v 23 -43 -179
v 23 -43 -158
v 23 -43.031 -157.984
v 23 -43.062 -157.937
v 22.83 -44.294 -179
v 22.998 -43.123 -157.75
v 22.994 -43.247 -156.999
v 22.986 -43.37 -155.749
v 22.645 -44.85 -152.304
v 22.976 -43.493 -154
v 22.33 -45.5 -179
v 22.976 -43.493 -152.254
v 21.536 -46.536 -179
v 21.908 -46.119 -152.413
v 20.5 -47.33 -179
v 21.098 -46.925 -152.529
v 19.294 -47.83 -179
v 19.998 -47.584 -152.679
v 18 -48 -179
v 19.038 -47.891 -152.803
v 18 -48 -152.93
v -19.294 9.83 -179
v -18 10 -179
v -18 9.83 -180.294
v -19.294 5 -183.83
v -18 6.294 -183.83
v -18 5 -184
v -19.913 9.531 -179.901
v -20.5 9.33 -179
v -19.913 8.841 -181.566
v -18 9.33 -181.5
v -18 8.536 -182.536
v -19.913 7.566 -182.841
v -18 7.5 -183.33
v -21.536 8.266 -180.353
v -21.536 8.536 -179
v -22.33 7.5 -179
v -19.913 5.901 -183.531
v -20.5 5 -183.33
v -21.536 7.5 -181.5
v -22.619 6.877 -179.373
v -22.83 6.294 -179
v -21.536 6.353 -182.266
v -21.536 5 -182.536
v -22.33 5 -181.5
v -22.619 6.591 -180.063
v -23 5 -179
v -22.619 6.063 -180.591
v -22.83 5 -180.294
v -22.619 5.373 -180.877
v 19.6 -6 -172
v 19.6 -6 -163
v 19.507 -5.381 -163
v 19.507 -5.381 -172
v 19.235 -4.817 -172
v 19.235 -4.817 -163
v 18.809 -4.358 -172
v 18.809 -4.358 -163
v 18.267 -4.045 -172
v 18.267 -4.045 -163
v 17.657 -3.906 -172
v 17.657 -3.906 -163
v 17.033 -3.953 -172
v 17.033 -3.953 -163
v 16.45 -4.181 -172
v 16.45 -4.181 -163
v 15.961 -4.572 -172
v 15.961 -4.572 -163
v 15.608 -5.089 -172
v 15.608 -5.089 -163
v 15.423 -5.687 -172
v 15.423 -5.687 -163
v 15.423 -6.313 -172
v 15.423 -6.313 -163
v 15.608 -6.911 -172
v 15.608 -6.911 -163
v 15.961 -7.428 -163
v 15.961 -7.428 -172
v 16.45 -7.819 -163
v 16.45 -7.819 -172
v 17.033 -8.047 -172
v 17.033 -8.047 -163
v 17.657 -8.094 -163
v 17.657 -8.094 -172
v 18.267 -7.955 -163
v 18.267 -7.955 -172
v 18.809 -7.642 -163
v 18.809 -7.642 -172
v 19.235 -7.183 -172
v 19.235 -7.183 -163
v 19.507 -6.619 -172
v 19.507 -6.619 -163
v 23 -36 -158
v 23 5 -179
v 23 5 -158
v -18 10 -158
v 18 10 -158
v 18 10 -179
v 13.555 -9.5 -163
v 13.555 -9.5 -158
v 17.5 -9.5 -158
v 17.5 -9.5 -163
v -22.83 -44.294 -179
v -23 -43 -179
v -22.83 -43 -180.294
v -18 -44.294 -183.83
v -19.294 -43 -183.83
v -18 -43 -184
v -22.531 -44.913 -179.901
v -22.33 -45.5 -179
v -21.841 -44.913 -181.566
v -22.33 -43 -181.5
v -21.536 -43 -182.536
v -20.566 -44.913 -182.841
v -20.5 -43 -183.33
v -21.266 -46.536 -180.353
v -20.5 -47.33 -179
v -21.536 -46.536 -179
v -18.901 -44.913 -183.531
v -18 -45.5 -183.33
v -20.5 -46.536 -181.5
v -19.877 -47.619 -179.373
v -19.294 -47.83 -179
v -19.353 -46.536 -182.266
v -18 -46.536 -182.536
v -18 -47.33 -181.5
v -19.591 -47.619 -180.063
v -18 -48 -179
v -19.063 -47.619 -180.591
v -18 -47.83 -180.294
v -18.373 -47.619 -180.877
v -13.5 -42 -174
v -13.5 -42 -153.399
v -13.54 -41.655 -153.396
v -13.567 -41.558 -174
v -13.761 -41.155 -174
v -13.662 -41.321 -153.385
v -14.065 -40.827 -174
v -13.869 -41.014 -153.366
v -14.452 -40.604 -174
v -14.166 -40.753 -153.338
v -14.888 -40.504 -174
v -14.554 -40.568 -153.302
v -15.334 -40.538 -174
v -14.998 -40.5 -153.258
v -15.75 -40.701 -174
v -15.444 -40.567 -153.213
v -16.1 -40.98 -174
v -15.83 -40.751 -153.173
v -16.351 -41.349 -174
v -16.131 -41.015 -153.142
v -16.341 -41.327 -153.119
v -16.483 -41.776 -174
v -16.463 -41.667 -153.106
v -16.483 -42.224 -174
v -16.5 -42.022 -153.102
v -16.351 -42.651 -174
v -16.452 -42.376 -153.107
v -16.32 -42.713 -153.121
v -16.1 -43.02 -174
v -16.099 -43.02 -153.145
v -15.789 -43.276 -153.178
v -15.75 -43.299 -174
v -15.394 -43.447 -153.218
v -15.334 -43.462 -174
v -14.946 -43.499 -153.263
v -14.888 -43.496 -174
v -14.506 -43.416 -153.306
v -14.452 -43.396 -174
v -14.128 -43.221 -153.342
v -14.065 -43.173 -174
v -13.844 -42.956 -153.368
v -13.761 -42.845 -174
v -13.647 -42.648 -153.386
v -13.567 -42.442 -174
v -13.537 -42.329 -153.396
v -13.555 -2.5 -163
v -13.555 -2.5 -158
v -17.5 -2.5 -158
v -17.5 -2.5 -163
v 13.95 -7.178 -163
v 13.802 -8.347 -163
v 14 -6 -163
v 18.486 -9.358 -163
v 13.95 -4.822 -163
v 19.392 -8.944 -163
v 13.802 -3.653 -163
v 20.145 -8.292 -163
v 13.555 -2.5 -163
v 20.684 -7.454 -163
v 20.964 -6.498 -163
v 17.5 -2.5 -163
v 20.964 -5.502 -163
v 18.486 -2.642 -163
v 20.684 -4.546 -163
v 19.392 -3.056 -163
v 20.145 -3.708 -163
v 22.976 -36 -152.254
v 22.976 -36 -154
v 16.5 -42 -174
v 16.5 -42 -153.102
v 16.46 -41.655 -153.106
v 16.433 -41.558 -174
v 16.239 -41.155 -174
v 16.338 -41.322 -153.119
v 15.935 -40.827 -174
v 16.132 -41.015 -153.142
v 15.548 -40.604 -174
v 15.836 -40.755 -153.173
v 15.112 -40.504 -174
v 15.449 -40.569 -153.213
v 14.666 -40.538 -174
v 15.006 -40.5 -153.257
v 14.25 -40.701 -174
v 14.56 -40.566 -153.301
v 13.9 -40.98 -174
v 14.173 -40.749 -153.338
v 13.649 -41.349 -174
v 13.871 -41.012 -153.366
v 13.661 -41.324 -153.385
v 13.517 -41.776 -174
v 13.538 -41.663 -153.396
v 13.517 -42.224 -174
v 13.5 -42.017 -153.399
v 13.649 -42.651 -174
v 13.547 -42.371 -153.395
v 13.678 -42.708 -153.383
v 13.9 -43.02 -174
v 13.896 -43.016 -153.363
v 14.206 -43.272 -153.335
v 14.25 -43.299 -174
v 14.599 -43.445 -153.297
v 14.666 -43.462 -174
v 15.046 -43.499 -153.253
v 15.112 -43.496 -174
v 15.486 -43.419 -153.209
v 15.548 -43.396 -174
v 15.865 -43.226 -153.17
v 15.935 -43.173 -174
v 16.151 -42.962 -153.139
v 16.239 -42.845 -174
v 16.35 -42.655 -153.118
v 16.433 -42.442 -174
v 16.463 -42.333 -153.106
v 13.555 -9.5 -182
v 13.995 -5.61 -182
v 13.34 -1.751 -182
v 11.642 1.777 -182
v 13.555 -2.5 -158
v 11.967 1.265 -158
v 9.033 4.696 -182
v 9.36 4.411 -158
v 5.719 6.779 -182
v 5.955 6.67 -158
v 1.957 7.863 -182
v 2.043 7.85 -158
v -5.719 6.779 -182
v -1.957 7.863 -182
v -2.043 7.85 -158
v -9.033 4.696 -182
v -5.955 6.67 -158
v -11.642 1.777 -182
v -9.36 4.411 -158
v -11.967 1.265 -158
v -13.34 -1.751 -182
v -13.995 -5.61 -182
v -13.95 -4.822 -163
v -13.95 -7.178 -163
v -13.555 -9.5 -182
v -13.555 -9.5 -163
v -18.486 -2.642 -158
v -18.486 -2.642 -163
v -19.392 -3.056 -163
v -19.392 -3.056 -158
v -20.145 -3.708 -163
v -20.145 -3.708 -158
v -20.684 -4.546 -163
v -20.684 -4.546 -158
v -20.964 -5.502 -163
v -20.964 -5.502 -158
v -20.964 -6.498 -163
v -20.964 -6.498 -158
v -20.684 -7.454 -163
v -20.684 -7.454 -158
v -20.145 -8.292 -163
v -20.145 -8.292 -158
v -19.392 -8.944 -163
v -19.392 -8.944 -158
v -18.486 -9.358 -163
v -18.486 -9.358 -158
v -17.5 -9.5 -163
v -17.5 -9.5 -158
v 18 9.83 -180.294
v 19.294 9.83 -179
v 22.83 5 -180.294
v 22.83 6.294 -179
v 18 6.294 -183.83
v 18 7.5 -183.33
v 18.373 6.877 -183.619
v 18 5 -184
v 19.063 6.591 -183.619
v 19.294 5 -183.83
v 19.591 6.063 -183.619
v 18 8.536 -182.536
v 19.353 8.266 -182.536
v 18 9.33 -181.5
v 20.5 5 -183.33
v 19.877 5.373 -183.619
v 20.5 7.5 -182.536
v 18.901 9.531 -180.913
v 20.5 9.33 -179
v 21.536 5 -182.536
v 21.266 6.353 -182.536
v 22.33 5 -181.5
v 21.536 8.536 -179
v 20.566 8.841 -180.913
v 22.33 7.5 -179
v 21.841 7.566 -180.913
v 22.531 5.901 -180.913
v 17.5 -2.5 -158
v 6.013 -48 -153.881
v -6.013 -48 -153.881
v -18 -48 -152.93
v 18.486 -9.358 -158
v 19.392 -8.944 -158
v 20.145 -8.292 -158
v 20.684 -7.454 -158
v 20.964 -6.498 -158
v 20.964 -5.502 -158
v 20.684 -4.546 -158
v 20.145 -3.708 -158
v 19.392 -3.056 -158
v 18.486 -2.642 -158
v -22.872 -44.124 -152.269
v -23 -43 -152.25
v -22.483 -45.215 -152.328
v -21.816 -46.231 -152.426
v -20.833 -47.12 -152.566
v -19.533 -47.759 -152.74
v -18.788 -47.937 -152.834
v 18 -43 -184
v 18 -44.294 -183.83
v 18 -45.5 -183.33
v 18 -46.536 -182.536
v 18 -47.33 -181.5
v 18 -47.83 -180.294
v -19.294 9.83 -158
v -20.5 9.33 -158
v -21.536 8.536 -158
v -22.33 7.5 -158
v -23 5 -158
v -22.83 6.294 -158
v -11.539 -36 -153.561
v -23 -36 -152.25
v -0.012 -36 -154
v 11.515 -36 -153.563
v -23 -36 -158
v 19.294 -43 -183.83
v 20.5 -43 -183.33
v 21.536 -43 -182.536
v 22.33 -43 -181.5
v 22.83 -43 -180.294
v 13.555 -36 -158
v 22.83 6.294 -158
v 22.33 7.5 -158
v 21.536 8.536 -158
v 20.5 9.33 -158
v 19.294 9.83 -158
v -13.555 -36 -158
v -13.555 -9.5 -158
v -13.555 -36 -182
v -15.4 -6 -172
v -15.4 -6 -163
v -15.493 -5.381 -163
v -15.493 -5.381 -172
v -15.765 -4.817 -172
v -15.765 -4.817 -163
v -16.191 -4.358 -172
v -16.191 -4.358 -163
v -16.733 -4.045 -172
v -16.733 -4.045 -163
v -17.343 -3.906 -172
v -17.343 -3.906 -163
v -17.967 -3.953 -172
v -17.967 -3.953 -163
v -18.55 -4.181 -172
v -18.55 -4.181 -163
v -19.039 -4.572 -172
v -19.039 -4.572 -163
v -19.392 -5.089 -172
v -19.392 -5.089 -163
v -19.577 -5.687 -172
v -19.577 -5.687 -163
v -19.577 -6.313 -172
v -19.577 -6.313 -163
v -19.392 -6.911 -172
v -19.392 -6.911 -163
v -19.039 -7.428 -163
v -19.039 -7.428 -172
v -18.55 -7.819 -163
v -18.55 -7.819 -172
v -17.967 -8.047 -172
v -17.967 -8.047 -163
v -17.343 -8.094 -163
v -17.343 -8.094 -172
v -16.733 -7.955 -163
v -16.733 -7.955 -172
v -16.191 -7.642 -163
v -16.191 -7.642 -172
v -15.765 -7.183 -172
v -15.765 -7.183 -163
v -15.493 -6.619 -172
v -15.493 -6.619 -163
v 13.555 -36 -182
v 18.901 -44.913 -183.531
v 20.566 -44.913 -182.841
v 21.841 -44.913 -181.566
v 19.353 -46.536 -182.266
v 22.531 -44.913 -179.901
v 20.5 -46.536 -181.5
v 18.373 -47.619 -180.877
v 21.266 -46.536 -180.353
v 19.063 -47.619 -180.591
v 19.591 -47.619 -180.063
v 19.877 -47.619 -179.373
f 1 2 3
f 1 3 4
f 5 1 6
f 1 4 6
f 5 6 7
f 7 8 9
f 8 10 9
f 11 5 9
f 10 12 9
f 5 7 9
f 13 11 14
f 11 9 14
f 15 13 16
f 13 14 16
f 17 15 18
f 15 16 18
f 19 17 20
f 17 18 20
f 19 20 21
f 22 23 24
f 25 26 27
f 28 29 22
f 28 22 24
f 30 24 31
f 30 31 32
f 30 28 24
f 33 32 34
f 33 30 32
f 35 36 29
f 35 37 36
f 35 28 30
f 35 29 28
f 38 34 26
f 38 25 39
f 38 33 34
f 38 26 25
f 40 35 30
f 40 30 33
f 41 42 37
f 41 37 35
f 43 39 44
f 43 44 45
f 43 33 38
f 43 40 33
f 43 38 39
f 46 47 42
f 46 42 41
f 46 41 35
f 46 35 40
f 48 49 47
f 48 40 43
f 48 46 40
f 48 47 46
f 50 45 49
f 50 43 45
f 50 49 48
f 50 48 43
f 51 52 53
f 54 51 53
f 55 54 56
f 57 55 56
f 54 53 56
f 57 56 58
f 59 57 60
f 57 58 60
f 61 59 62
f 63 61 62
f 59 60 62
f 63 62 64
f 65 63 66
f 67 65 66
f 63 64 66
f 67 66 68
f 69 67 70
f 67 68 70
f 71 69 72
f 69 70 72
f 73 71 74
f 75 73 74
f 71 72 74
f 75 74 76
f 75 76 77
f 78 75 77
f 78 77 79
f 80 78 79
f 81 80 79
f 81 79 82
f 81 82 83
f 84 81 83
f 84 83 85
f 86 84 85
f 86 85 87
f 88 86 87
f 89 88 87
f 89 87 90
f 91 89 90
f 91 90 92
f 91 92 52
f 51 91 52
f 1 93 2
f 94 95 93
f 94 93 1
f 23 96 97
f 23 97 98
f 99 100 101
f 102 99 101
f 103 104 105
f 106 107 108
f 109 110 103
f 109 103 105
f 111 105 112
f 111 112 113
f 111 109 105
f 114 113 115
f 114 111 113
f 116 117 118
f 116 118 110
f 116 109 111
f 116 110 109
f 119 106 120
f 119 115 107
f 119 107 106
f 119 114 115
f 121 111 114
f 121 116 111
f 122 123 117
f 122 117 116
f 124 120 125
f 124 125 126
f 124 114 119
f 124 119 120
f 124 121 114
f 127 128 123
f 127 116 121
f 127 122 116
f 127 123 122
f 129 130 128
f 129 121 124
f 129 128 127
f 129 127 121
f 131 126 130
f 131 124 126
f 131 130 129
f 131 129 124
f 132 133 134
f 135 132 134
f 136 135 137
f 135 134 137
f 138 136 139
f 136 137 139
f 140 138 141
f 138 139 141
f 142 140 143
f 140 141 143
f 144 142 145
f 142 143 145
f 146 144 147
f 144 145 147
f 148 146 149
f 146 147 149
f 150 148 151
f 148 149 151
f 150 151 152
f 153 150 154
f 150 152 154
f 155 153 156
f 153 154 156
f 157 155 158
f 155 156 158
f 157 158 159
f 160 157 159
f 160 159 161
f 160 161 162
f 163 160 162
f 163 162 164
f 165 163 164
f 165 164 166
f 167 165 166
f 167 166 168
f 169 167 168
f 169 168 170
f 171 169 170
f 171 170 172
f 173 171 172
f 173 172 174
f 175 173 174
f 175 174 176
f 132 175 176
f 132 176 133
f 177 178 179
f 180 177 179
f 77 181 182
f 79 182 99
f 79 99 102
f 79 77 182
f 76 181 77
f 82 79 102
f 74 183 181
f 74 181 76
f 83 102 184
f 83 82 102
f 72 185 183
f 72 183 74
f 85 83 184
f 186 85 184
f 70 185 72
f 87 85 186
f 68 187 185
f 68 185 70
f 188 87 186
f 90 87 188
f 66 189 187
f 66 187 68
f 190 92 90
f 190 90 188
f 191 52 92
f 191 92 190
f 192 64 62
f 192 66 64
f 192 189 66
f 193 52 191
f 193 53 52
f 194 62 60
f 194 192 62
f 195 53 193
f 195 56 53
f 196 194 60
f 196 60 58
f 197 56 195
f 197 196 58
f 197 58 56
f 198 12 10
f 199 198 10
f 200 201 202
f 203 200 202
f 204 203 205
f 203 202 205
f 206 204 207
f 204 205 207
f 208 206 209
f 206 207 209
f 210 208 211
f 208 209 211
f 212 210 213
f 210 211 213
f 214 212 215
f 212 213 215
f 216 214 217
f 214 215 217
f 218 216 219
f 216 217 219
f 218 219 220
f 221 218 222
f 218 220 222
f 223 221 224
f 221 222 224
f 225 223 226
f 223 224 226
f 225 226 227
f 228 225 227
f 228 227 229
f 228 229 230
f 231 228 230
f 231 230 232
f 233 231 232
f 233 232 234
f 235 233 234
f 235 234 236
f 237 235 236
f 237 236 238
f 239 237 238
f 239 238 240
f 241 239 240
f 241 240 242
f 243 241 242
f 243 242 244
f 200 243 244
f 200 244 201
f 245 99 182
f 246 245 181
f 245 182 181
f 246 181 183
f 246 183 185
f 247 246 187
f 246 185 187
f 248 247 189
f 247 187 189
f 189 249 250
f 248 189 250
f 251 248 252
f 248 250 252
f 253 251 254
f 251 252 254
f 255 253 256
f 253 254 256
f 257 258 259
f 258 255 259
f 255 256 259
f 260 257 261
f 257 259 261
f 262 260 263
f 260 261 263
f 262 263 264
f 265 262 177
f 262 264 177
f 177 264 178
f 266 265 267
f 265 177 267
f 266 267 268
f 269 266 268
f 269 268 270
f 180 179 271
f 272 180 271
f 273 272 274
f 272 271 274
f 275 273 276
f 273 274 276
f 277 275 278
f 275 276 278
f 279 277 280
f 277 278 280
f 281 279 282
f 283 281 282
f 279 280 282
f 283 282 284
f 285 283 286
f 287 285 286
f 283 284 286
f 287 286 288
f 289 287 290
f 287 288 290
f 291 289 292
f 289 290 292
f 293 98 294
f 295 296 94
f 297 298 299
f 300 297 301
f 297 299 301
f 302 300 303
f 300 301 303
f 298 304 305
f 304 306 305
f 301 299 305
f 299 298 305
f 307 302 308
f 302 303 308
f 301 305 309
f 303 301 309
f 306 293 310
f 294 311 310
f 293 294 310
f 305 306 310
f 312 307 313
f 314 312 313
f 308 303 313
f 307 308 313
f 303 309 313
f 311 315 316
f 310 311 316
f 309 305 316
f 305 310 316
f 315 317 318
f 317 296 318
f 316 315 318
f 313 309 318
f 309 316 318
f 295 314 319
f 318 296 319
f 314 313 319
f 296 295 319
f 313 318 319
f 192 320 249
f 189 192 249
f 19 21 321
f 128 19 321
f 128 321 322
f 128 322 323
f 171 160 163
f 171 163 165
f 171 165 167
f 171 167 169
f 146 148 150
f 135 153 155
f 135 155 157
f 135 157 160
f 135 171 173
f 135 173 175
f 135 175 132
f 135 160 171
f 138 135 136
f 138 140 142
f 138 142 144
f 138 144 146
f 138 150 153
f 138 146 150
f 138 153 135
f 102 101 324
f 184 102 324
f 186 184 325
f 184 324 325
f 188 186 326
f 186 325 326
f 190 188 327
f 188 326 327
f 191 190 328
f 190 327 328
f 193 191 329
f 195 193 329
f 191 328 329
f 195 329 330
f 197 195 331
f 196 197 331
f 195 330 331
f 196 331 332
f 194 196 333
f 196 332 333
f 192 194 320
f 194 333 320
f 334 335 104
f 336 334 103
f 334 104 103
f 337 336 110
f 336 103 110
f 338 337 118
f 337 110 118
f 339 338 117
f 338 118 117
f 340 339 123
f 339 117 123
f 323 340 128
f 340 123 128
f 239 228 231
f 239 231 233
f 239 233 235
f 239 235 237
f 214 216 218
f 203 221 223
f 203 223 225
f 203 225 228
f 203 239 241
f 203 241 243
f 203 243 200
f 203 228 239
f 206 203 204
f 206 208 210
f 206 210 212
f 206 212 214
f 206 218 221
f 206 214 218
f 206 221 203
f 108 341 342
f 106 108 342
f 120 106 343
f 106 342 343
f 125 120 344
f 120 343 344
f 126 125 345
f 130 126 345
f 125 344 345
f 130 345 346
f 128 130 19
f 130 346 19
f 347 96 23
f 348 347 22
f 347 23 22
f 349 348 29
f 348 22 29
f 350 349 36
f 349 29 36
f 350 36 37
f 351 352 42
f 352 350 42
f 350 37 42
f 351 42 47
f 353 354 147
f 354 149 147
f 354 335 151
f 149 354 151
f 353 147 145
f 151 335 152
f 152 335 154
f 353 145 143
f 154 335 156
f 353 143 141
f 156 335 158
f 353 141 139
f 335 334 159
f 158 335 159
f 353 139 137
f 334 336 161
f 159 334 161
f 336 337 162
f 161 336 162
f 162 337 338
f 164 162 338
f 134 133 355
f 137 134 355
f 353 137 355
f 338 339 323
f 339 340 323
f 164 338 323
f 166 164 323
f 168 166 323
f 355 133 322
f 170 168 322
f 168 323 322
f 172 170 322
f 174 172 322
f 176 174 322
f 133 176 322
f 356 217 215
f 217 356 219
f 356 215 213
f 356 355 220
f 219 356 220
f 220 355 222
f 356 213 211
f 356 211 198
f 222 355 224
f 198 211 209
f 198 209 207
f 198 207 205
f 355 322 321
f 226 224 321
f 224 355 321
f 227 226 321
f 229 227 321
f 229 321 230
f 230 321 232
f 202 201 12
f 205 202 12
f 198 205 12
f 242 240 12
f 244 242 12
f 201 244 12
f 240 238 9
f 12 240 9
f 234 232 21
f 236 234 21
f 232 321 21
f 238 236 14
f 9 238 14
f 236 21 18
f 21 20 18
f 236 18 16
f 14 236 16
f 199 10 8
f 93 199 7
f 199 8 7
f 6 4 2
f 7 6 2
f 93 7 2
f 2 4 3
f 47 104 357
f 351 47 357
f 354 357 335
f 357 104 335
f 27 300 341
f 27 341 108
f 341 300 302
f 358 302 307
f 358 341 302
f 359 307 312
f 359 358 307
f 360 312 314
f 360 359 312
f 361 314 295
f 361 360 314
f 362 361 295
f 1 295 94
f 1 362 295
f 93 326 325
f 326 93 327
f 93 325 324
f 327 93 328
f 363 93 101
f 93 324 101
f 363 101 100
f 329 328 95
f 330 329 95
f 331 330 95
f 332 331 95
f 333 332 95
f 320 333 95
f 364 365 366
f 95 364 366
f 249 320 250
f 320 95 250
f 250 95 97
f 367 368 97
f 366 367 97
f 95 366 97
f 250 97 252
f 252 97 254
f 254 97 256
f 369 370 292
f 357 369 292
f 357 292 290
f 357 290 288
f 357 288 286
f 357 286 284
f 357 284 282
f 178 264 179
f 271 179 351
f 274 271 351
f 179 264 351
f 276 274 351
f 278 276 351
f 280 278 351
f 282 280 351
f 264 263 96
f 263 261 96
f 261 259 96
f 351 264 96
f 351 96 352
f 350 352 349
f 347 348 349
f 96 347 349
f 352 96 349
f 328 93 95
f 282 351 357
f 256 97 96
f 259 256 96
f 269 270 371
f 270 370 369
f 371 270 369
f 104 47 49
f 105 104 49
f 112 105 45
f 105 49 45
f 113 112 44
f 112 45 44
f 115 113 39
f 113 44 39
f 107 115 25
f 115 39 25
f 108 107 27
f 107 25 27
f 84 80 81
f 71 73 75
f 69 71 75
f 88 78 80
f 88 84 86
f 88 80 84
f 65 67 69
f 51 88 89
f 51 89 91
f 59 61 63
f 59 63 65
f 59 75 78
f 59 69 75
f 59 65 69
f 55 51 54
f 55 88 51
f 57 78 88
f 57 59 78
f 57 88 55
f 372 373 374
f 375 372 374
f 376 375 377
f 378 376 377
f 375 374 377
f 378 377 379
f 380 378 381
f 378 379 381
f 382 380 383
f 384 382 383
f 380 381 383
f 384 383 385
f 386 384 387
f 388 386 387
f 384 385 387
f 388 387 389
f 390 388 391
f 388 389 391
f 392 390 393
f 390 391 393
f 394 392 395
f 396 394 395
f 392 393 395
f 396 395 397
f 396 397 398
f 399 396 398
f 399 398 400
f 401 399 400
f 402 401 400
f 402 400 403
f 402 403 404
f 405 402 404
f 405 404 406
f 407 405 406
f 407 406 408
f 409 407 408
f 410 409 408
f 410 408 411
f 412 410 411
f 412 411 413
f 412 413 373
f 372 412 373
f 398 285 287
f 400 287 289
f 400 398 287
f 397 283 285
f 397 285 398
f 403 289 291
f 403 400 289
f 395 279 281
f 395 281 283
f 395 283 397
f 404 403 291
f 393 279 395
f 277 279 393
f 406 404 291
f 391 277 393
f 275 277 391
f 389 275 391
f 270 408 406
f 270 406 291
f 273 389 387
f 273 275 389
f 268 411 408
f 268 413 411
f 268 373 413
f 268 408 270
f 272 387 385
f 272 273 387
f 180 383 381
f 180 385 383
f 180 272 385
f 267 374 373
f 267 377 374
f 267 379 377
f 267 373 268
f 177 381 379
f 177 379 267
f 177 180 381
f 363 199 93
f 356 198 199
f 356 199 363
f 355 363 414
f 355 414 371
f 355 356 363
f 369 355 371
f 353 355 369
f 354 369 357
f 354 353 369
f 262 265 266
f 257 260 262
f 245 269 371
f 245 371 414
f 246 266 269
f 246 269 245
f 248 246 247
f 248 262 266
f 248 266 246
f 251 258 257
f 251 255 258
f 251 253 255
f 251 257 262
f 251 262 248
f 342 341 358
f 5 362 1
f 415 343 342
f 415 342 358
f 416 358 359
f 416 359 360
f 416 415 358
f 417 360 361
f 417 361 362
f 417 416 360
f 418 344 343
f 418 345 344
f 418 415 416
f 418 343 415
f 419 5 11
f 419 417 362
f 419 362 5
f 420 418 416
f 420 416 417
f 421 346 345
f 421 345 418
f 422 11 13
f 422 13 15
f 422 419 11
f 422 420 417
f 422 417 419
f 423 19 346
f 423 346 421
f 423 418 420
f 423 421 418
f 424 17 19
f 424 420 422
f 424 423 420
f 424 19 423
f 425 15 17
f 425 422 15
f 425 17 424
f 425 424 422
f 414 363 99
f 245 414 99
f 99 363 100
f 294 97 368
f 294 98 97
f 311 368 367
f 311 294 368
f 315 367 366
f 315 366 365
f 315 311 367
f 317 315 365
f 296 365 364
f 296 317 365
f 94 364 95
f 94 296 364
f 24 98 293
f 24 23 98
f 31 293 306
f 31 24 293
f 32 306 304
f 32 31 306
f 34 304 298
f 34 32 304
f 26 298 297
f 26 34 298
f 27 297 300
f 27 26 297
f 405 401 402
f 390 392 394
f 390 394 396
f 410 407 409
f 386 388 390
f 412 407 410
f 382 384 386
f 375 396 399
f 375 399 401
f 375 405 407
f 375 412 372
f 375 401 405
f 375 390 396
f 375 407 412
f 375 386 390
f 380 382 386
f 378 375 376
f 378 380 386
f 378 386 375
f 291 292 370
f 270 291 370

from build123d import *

# Parameters (mm, degrees)
ESQUISSE1_W             = 26
ESQUISSE1_H             = 46
BOSS_EXTRU_1_DEPTH      = 10
ESQUISSE1_5_W           = 26
ESQUISSE1_5_H           = 46
BOSS_EXTRU_2_DEPTH      = 48
ESQUISSE2_R             = 14
ESQUISSE2_R_2           = 2.5
ENL_V_MAT_EXTRU_1_DEPTH = 24
ESQUISSE2_17_R          = 2.1
ENL_V_MAT_EXTRU_2_DEPTH = 5
ESQUISSE2_18_R          = 2.1
ENL_V_MAT_EXTRU_3_DEPTH = 14
BOSS_EXTRU_7_DEPTH      = 12
CONG_1_R                = 5
CONG_2_R                = 5
ESQUISSE6_R             = 1.5
ENL_V_MAT_EXTRU_4_DEPTH = 174


with BuildPart() as part:
    # Esquisse1 → Boss.-Extru.1 (new body)
    with BuildSketch(Plane(origin=(0, 0, 0), x_dir=(0, 0, -1), z_dir=(0, 1, 0))):
        with Locations((171, 0)):
            Rectangle(ESQUISSE1_W, ESQUISSE1_H)
    extrude(amount=BOSS_EXTRU_1_DEPTH)

    # Esquisse1<5> → Boss.-Extru.2 (add)
    with BuildSketch(Plane(origin=(0, 0, 0), x_dir=(0, 0, -1), z_dir=(0, 1, 0))):
        with Locations((171, 0)):
            Rectangle(ESQUISSE1_5_W, ESQUISSE1_5_H)
    extrude(amount=-BOSS_EXTRU_2_DEPTH)

    # Esquisse2 → Enlèv. mat.-Extru.1 (cut)
    # profile 1 of 3: a face of its own
    with BuildSketch(Plane.XY.offset(-158)):
        with Locations((0, -6)):
            Circle(ESQUISSE2_R)
        with Locations((0, 2)):
            Circle(ESQUISSE2_R_2, mode=Mode.SUBTRACT)
    # profile 2 of 3: a face of its own
    with BuildSketch(Plane.XY.offset(-158)):
        with BuildLine():
            ThreePointArc((13.555441712, -9.5), (0, -20), (-13.555441712, -9.5))
            Line((-13.555441712, -9.5), (-13.555441712, -36))
            Line((-13.555441712, -36), (13.555441712, -36))
            Line((13.555441712, -36), (13.555441712, -9.5))
        make_face()
    # profile 3 of 3: a face of its own
    with BuildSketch(Plane.XY.offset(-158)):
        with Locations((0, 2)):
            Circle(ESQUISSE2_R_2)
    extrude(amount=-ENL_V_MAT_EXTRU_1_DEPTH, mode=Mode.SUBTRACT)

    # Esquisse2<17> → Enlèv. mat.-Extru.2 (cut)
    # profile 1 of 2: a face of its own
    with BuildSketch(Plane.XY.offset(-158)):
        with BuildLine():
            Line((-13.555441712, -2.5), (-17.5, -2.5))
            ThreePointArc((-17.5, -2.5), (-21, -6), (-17.5, -9.5))
            Line((-17.5, -9.5), (-13.555441712, -9.5))
            ThreePointArc((-13.555441712, -9.5), (-14, -6), (-13.555441712, -2.5))
        make_face()
        with Locations((-17.5, -6)):
            Circle(ESQUISSE2_17_R, mode=Mode.SUBTRACT)
    # profile 2 of 2: a face of its own
    with BuildSketch(Plane.XY.offset(-158)):
        with BuildLine():
            Line((17.5, -2.5), (13.555441712, -2.5))
            ThreePointArc((13.555441712, -2.5), (13.888415748, -4.235939905), (14, -6))
            ThreePointArc((14, -6), (13.888415748, -7.764060095), (13.555441712, -9.5))
            Line((13.555441712, -9.5), (17.5, -9.5))
            ThreePointArc((17.5, -9.5), (21, -6), (17.5, -2.5))
        make_face()
        with Locations((17.5, -6)):
            Circle(ESQUISSE2_17_R, mode=Mode.SUBTRACT)
    extrude(amount=-ENL_V_MAT_EXTRU_2_DEPTH, mode=Mode.SUBTRACT)

    # Esquisse2<18> → Enlèv. mat.-Extru.3 (cut)
    with BuildSketch(Plane.XY.offset(-158)):
        with Locations((-17.5, -6)):
            Circle(ESQUISSE2_18_R)
        with Locations((17.5, -6)):
            Circle(ESQUISSE2_18_R)
    extrude(amount=-ENL_V_MAT_EXTRU_3_DEPTH, mode=Mode.SUBTRACT)

    # Esquisse5 → Boss.-Extru.7 (add)
    with BuildSketch(Plane.XZ.offset(48)):
        with BuildLine():
            Line((-23, -158), (-23, -154))
            Line((-23, -154), (-23, -152.249792013))
            ThreePointArc((-23, -152.249792013), (-0.012314253, -153.999999501), (22.975654778, -152.253516723))
            Line((22.975654778, -152.253516723), (22.975654778, -154))
            Line((22.975654778, -154), (23, -158))
            Line((23, -158), (23, -184))
            Line((23, -184), (-23, -184))
            Line((-23, -184), (-23, -158))
        make_face()
    extrude(amount=-BOSS_EXTRU_7_DEPTH)

    # Congé1
    cong_1_edges = [part.edges().sort_by_distance(p)[0] for p in [
        (23, 10, -171),
        (0, 10, -184),
        (23, -19, -184),
    ]]
    fillet(cong_1_edges, radius=CONG_1_R)

    # Congé2
    # the kernel refuses this fillet: 5 mm, written as the material it takes off along each edge
    with BuildSketch(Plane(origin=(-18, -43, -179), x_dir=(-1, 0, 0), z_dir=(0, -1, 0))) as cong_2_piece_1_section:
        Polygon((0, 0), (CONG_2_R * 1.02, 0), (CONG_2_R * 1.02, CONG_2_R * 1.02), (0, CONG_2_R * 1.02), align=None)
    cong_2_piece_1 = extrude(amount=CONG_2_R * 1.02, mode=Mode.PRIVATE)
    cong_2_piece_1 = cong_2_piece_1 - Plane(origin=(-18, -43, -179), x_dir=(0.7071067811865475, 0, 0.7071067811865475), z_dir=(0, -1, 0)) * Sphere(CONG_2_R, mode=Mode.PRIVATE)
    add(cong_2_piece_1, mode=Mode.SUBTRACT)
    with BuildSketch(Plane(origin=(18, -48, -179), x_dir=(0, 0, -1), z_dir=(-1, 0, 0))) as cong_2_piece_2:
        with BuildLine():
            CenterArc((5 - CONG_2_R, -CONG_2_R), CONG_2_R, 0, 90)
            Line((5 - CONG_2_R, 0), (5, 0))
            Line((5, 0), (5, -CONG_2_R))
        make_face()
    revolve(axis=Axis((18, -48, -179), (0, -1, 0)), revolution_arc=90, mode=Mode.SUBTRACT)
    with BuildSketch(Plane(origin=(-23, 5, -179), x_dir=(0, 1, 0), z_dir=(0, 0, 1))) as cong_2_piece_3:
        with BuildLine():
            CenterArc((5 - CONG_2_R, -CONG_2_R), CONG_2_R, 0, 90)
            Line((5, -CONG_2_R), (5, 0))
            Line((5, 0), (5 - CONG_2_R, 0))
        make_face()
    revolve(axis=Axis((-23, 5, -179), (-1, 0, 0)), revolution_arc=90, mode=Mode.SUBTRACT)
    with BuildSketch(Plane(origin=(-23, -48, -179), x_dir=(0, 1, 0), z_dir=(0, 0, 1))) as cong_2_piece_4:
        with BuildLine():
            CenterArc((CONG_2_R, -CONG_2_R), CONG_2_R, 90, 90)
            Line((0, -CONG_2_R), (0, 0))
            Line((0, 0), (CONG_2_R, 0))
        make_face()
    extrude(amount=39.250207987, mode=Mode.SUBTRACT)
    with BuildSketch(Plane(origin=(23, -48, -145.5), x_dir=(0, 1, 0), z_dir=(0, 0, -1)), Plane(origin=(-23, 10, -179), x_dir=(1, 0, 0), z_dir=(0, 0, 1))) as cong_2_piece_5:
        with BuildLine():
            CenterArc((CONG_2_R, -CONG_2_R), CONG_2_R, 90, 90)
            Line((0, -CONG_2_R), (0, 0))
            Line((0, 0), (CONG_2_R, 0))
        make_face()
    extrude(amount=33.5, mode=Mode.SUBTRACT)
    with BuildSketch(Plane(origin=(18, -48, -184), x_dir=(0, 0, 1), z_dir=(-1, 0, 0))) as cong_2_piece_6:
        with BuildLine():
            CenterArc((CONG_2_R, CONG_2_R), CONG_2_R, 180, 90)
            Line((0, CONG_2_R), (0, 0))
            Line((0, 0), (CONG_2_R, 0))
        make_face()
    extrude(amount=36, mode=Mode.SUBTRACT)
    with BuildSketch(Plane(origin=(-23, 5, -184), x_dir=(0, 0, 1), z_dir=(0, -1, 0))) as cong_2_piece_7:
        with BuildLine():
            CenterArc((CONG_2_R, -CONG_2_R), CONG_2_R, 90, 90)
            Line((0, -CONG_2_R), (0, 0))
            Line((0, 0), (CONG_2_R, 0))
        make_face()
    extrude(amount=48, mode=Mode.SUBTRACT)

    # Esquisse6 → Enlèv. mat.-Extru.4 (cut)
    with BuildSketch(Plane.XY):
        with Locations((-15, -42)):
            Circle(ESQUISSE6_R)
        with Locations((15, -42)):
            Circle(ESQUISSE6_R)
    extrude(amount=-ENL_V_MAT_EXTRU_4_DEPTH, mode=Mode.SUBTRACT)


solid = part.part
